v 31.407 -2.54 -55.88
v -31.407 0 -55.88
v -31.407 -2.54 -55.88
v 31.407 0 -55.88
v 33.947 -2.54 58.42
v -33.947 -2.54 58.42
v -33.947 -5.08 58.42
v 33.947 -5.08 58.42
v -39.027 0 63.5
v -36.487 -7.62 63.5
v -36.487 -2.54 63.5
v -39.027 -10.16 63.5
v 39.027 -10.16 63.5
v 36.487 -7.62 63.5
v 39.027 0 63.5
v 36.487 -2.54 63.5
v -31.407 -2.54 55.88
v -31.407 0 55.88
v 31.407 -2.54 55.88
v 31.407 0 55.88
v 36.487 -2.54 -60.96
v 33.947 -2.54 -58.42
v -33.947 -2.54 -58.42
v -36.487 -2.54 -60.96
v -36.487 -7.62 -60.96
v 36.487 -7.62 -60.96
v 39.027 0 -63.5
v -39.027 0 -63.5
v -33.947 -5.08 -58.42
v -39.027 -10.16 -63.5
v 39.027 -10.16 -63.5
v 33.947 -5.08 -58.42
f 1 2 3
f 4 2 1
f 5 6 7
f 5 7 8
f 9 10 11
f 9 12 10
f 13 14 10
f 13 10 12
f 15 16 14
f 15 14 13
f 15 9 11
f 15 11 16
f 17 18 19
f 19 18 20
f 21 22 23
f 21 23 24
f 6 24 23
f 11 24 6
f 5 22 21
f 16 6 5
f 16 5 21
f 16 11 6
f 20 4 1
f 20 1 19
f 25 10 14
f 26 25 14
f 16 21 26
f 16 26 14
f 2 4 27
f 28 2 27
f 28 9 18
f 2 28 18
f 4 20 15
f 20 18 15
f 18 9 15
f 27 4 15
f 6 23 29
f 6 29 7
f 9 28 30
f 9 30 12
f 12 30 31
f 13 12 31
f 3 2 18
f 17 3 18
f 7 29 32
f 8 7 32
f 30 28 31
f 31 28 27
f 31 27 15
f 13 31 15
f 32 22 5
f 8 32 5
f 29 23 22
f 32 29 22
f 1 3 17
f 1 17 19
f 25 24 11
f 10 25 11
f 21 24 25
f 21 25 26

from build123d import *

# Parameters (mm, degrees)
F0_W     = 78.0542
F0_H     = 127
F1_DEPTH = 10.16
F2_T     = -7.62
F3_T     = -2.54


with BuildPart() as f1:
    # F0 (on Front) → F1 (new body)
    with BuildSketch(Plane.XZ):
        Rectangle(F0_W, F0_H)
    extrude(amount=F1_DEPTH)

    # F2
    f2_openings = [f1.faces().sort_by_distance(p)[0] for p in [
        (0, 0, 0),
    ]]
    offset(amount=F2_T, openings=f2_openings)

    # F3
    f3_openings = [f1.faces().sort_by_distance(p)[0] for p in [
        (0, -5.08, 63.5),
    ]]
    offset(amount=F3_T, openings=f3_openings, kind=Kind.INTERSECTION)


solid = f1.part
